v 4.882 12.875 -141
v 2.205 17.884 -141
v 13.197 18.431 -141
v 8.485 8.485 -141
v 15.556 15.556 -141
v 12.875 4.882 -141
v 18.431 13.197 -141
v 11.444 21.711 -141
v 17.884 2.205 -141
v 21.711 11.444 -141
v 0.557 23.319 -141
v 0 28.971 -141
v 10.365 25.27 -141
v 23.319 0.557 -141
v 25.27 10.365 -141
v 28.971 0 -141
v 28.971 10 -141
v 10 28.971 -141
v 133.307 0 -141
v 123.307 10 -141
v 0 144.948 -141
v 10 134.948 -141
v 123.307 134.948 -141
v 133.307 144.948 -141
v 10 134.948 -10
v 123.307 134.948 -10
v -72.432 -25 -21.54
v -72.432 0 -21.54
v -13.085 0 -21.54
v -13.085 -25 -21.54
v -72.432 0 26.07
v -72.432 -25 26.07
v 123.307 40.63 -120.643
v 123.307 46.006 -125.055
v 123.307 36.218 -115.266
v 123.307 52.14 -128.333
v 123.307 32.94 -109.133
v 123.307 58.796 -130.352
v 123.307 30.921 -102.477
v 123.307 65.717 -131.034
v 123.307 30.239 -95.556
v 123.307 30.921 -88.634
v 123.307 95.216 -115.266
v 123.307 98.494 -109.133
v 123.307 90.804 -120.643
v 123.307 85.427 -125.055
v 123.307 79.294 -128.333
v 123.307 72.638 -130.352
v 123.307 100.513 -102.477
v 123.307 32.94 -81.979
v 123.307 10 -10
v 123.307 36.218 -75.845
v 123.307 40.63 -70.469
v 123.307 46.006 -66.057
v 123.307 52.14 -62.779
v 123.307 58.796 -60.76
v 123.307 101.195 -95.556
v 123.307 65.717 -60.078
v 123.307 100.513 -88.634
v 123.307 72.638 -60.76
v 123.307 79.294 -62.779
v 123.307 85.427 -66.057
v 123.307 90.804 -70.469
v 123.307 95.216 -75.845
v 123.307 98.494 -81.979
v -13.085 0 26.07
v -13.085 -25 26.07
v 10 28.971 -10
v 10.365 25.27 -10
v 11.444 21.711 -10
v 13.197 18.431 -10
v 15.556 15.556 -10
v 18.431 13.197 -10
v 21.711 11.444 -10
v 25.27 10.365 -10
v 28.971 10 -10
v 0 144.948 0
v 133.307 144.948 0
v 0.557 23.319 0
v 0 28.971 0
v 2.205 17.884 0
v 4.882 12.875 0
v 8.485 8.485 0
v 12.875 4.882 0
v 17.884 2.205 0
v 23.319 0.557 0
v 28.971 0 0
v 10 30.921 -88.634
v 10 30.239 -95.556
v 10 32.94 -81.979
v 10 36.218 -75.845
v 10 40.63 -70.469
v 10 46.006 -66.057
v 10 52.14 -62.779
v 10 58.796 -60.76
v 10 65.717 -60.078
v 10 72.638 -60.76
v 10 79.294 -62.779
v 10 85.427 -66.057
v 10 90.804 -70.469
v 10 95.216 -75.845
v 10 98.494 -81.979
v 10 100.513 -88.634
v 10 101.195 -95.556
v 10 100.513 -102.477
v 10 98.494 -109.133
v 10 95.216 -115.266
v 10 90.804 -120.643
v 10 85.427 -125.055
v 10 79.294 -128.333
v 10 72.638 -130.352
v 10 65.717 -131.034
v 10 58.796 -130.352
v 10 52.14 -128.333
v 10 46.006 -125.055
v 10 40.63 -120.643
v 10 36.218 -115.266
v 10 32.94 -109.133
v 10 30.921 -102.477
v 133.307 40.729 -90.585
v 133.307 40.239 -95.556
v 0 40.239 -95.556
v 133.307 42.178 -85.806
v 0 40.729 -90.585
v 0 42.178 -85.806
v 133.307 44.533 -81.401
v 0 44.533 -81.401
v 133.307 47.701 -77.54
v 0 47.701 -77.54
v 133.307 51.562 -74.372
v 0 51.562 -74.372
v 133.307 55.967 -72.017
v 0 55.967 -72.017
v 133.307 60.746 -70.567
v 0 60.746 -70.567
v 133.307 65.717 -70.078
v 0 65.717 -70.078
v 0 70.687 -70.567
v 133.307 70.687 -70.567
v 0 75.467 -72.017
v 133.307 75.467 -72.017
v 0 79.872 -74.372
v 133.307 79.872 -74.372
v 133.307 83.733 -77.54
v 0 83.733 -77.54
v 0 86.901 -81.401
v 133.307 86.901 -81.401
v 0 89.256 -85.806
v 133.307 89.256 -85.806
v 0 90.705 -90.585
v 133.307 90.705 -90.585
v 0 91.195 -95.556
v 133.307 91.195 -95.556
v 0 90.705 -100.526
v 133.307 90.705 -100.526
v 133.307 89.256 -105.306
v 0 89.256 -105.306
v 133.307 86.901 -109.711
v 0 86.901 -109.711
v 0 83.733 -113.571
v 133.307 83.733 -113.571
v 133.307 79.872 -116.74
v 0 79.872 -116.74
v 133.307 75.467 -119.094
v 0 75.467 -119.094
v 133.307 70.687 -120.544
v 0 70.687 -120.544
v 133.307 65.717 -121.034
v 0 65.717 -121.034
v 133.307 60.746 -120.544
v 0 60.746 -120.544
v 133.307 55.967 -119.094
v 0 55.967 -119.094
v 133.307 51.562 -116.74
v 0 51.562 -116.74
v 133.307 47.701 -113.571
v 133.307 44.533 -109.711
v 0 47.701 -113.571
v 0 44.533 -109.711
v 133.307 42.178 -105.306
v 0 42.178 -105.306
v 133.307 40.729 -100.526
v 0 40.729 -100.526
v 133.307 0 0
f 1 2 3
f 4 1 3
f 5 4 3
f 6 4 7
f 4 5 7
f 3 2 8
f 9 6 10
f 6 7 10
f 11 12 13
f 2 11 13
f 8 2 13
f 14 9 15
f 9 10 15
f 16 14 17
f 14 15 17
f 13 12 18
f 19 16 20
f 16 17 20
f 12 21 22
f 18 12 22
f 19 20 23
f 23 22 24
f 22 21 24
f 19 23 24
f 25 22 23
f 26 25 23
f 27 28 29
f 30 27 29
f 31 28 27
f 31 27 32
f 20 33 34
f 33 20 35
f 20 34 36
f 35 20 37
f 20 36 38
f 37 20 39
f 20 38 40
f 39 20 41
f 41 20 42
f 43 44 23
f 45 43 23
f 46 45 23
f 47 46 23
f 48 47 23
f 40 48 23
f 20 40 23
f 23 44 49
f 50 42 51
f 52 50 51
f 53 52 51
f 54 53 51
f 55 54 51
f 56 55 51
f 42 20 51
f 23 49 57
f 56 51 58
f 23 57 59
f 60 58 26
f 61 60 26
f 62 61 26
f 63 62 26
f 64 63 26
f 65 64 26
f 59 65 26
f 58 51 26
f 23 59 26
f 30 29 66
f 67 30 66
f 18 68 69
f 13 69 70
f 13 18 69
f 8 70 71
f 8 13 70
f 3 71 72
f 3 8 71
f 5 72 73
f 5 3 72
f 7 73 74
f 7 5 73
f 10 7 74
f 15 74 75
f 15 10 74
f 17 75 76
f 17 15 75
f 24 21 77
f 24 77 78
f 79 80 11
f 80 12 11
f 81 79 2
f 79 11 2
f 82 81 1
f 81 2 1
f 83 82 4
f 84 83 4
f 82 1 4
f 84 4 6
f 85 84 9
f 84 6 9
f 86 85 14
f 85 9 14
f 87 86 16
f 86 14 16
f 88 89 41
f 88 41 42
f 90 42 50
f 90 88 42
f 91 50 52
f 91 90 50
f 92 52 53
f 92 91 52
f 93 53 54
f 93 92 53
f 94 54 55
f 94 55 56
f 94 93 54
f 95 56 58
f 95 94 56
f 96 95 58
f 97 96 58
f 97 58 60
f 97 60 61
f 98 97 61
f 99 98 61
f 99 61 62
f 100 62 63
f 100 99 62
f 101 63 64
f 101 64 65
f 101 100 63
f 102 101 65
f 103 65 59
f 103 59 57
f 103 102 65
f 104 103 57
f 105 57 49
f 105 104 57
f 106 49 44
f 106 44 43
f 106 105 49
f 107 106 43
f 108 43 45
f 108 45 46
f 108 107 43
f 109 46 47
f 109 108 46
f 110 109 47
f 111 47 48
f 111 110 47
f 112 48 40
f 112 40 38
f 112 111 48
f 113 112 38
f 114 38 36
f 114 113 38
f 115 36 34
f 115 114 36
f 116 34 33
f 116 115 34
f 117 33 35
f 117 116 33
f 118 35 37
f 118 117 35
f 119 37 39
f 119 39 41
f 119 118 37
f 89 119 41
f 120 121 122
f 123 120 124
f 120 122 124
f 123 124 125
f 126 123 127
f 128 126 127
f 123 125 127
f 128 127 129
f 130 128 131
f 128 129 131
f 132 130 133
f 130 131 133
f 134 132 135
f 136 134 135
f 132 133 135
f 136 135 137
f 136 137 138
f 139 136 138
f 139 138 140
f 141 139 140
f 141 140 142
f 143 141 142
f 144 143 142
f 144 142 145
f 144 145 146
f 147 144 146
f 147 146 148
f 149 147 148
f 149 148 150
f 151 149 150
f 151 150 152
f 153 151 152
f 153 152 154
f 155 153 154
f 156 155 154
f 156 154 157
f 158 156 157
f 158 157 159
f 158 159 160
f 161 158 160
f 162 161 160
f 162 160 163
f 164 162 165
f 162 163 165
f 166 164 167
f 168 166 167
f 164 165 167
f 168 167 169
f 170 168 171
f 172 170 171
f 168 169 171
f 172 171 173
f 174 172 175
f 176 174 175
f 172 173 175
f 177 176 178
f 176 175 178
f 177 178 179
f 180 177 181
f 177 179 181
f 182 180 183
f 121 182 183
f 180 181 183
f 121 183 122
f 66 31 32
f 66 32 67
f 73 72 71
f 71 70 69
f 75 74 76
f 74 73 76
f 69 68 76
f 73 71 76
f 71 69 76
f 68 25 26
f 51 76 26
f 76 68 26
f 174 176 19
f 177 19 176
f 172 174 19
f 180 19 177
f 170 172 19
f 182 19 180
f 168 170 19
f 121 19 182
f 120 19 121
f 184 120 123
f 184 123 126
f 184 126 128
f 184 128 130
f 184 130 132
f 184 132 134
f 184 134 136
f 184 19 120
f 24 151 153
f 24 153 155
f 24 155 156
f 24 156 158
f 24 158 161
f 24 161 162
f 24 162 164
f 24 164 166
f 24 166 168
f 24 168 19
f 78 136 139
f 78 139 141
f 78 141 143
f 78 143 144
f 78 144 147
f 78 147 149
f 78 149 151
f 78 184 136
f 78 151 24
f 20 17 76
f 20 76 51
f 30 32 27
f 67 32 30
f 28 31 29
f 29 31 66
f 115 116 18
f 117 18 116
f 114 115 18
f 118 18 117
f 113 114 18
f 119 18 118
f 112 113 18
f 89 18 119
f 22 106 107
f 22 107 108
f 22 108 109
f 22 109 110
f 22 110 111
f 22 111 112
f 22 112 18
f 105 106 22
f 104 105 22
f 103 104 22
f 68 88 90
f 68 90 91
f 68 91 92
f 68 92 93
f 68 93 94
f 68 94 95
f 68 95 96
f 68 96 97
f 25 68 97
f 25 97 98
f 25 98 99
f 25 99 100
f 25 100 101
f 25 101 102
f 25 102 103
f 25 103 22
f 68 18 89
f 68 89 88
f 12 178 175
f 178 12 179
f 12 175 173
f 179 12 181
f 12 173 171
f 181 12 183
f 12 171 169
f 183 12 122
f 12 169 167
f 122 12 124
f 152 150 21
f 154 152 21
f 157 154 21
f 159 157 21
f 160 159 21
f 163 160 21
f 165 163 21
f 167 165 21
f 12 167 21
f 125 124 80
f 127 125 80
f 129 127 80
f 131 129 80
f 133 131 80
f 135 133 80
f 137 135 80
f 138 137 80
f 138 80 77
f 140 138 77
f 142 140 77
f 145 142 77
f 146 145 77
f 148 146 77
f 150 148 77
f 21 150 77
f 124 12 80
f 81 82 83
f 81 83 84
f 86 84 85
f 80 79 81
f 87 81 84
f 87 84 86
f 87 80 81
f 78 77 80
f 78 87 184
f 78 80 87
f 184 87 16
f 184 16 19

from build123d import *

# Parameters (mm, degrees)
F0_W     = 133.306772
F0_H     = 144.947588
F1_DEPTH = 141
F2_R     = 25.477934
F3_DEPTH = 133.307772
F4_R     = 28.970563
F5_T     = -10
F6_W     = 59.347406
F6_H     = 47.610507
F7_DEPTH = 25


with BuildPart() as f1:
    # F0 (on Top) → F1 (new body)
    with BuildSketch(Plane.XY):
        with Locations((66.653386, 72.473794)):
            Rectangle(F0_W, F0_H)
    extrude(amount=-F1_DEPTH)

    # F2 (on face) → F3 (cut, through all)
    with BuildSketch(Plane(origin=(0, 0, 0), x_dir=(0, -1, 0), z_dir=(-1, 0, 0))):
        with Locations((-65.716974, -95.555864)):
            Circle(F2_R)
    extrude(amount=-F3_DEPTH, mode=Mode.SUBTRACT)

    # F4
    f4_edges = [f1.edges().sort_by_distance(p)[0] for p in [
        (0, 0, -70.5),
    ]]
    fillet(f4_edges, radius=F4_R)

    # F5
    f5_openings = [f1.faces().sort_by_distance(p)[0] for p in [
        (67.219651, 73.094825, -141),
    ]]
    offset(amount=F5_T, openings=f5_openings)


with BuildPart() as f7:
    # F6 (on Front) → F7 (new body)
    with BuildSketch(Plane.XZ):
        with Locations((-42.758577, 2.264978)):
            Rectangle(F6_W, F6_H)
    extrude(amount=F7_DEPTH)


solid = Compound([f1.part, f7.part])
